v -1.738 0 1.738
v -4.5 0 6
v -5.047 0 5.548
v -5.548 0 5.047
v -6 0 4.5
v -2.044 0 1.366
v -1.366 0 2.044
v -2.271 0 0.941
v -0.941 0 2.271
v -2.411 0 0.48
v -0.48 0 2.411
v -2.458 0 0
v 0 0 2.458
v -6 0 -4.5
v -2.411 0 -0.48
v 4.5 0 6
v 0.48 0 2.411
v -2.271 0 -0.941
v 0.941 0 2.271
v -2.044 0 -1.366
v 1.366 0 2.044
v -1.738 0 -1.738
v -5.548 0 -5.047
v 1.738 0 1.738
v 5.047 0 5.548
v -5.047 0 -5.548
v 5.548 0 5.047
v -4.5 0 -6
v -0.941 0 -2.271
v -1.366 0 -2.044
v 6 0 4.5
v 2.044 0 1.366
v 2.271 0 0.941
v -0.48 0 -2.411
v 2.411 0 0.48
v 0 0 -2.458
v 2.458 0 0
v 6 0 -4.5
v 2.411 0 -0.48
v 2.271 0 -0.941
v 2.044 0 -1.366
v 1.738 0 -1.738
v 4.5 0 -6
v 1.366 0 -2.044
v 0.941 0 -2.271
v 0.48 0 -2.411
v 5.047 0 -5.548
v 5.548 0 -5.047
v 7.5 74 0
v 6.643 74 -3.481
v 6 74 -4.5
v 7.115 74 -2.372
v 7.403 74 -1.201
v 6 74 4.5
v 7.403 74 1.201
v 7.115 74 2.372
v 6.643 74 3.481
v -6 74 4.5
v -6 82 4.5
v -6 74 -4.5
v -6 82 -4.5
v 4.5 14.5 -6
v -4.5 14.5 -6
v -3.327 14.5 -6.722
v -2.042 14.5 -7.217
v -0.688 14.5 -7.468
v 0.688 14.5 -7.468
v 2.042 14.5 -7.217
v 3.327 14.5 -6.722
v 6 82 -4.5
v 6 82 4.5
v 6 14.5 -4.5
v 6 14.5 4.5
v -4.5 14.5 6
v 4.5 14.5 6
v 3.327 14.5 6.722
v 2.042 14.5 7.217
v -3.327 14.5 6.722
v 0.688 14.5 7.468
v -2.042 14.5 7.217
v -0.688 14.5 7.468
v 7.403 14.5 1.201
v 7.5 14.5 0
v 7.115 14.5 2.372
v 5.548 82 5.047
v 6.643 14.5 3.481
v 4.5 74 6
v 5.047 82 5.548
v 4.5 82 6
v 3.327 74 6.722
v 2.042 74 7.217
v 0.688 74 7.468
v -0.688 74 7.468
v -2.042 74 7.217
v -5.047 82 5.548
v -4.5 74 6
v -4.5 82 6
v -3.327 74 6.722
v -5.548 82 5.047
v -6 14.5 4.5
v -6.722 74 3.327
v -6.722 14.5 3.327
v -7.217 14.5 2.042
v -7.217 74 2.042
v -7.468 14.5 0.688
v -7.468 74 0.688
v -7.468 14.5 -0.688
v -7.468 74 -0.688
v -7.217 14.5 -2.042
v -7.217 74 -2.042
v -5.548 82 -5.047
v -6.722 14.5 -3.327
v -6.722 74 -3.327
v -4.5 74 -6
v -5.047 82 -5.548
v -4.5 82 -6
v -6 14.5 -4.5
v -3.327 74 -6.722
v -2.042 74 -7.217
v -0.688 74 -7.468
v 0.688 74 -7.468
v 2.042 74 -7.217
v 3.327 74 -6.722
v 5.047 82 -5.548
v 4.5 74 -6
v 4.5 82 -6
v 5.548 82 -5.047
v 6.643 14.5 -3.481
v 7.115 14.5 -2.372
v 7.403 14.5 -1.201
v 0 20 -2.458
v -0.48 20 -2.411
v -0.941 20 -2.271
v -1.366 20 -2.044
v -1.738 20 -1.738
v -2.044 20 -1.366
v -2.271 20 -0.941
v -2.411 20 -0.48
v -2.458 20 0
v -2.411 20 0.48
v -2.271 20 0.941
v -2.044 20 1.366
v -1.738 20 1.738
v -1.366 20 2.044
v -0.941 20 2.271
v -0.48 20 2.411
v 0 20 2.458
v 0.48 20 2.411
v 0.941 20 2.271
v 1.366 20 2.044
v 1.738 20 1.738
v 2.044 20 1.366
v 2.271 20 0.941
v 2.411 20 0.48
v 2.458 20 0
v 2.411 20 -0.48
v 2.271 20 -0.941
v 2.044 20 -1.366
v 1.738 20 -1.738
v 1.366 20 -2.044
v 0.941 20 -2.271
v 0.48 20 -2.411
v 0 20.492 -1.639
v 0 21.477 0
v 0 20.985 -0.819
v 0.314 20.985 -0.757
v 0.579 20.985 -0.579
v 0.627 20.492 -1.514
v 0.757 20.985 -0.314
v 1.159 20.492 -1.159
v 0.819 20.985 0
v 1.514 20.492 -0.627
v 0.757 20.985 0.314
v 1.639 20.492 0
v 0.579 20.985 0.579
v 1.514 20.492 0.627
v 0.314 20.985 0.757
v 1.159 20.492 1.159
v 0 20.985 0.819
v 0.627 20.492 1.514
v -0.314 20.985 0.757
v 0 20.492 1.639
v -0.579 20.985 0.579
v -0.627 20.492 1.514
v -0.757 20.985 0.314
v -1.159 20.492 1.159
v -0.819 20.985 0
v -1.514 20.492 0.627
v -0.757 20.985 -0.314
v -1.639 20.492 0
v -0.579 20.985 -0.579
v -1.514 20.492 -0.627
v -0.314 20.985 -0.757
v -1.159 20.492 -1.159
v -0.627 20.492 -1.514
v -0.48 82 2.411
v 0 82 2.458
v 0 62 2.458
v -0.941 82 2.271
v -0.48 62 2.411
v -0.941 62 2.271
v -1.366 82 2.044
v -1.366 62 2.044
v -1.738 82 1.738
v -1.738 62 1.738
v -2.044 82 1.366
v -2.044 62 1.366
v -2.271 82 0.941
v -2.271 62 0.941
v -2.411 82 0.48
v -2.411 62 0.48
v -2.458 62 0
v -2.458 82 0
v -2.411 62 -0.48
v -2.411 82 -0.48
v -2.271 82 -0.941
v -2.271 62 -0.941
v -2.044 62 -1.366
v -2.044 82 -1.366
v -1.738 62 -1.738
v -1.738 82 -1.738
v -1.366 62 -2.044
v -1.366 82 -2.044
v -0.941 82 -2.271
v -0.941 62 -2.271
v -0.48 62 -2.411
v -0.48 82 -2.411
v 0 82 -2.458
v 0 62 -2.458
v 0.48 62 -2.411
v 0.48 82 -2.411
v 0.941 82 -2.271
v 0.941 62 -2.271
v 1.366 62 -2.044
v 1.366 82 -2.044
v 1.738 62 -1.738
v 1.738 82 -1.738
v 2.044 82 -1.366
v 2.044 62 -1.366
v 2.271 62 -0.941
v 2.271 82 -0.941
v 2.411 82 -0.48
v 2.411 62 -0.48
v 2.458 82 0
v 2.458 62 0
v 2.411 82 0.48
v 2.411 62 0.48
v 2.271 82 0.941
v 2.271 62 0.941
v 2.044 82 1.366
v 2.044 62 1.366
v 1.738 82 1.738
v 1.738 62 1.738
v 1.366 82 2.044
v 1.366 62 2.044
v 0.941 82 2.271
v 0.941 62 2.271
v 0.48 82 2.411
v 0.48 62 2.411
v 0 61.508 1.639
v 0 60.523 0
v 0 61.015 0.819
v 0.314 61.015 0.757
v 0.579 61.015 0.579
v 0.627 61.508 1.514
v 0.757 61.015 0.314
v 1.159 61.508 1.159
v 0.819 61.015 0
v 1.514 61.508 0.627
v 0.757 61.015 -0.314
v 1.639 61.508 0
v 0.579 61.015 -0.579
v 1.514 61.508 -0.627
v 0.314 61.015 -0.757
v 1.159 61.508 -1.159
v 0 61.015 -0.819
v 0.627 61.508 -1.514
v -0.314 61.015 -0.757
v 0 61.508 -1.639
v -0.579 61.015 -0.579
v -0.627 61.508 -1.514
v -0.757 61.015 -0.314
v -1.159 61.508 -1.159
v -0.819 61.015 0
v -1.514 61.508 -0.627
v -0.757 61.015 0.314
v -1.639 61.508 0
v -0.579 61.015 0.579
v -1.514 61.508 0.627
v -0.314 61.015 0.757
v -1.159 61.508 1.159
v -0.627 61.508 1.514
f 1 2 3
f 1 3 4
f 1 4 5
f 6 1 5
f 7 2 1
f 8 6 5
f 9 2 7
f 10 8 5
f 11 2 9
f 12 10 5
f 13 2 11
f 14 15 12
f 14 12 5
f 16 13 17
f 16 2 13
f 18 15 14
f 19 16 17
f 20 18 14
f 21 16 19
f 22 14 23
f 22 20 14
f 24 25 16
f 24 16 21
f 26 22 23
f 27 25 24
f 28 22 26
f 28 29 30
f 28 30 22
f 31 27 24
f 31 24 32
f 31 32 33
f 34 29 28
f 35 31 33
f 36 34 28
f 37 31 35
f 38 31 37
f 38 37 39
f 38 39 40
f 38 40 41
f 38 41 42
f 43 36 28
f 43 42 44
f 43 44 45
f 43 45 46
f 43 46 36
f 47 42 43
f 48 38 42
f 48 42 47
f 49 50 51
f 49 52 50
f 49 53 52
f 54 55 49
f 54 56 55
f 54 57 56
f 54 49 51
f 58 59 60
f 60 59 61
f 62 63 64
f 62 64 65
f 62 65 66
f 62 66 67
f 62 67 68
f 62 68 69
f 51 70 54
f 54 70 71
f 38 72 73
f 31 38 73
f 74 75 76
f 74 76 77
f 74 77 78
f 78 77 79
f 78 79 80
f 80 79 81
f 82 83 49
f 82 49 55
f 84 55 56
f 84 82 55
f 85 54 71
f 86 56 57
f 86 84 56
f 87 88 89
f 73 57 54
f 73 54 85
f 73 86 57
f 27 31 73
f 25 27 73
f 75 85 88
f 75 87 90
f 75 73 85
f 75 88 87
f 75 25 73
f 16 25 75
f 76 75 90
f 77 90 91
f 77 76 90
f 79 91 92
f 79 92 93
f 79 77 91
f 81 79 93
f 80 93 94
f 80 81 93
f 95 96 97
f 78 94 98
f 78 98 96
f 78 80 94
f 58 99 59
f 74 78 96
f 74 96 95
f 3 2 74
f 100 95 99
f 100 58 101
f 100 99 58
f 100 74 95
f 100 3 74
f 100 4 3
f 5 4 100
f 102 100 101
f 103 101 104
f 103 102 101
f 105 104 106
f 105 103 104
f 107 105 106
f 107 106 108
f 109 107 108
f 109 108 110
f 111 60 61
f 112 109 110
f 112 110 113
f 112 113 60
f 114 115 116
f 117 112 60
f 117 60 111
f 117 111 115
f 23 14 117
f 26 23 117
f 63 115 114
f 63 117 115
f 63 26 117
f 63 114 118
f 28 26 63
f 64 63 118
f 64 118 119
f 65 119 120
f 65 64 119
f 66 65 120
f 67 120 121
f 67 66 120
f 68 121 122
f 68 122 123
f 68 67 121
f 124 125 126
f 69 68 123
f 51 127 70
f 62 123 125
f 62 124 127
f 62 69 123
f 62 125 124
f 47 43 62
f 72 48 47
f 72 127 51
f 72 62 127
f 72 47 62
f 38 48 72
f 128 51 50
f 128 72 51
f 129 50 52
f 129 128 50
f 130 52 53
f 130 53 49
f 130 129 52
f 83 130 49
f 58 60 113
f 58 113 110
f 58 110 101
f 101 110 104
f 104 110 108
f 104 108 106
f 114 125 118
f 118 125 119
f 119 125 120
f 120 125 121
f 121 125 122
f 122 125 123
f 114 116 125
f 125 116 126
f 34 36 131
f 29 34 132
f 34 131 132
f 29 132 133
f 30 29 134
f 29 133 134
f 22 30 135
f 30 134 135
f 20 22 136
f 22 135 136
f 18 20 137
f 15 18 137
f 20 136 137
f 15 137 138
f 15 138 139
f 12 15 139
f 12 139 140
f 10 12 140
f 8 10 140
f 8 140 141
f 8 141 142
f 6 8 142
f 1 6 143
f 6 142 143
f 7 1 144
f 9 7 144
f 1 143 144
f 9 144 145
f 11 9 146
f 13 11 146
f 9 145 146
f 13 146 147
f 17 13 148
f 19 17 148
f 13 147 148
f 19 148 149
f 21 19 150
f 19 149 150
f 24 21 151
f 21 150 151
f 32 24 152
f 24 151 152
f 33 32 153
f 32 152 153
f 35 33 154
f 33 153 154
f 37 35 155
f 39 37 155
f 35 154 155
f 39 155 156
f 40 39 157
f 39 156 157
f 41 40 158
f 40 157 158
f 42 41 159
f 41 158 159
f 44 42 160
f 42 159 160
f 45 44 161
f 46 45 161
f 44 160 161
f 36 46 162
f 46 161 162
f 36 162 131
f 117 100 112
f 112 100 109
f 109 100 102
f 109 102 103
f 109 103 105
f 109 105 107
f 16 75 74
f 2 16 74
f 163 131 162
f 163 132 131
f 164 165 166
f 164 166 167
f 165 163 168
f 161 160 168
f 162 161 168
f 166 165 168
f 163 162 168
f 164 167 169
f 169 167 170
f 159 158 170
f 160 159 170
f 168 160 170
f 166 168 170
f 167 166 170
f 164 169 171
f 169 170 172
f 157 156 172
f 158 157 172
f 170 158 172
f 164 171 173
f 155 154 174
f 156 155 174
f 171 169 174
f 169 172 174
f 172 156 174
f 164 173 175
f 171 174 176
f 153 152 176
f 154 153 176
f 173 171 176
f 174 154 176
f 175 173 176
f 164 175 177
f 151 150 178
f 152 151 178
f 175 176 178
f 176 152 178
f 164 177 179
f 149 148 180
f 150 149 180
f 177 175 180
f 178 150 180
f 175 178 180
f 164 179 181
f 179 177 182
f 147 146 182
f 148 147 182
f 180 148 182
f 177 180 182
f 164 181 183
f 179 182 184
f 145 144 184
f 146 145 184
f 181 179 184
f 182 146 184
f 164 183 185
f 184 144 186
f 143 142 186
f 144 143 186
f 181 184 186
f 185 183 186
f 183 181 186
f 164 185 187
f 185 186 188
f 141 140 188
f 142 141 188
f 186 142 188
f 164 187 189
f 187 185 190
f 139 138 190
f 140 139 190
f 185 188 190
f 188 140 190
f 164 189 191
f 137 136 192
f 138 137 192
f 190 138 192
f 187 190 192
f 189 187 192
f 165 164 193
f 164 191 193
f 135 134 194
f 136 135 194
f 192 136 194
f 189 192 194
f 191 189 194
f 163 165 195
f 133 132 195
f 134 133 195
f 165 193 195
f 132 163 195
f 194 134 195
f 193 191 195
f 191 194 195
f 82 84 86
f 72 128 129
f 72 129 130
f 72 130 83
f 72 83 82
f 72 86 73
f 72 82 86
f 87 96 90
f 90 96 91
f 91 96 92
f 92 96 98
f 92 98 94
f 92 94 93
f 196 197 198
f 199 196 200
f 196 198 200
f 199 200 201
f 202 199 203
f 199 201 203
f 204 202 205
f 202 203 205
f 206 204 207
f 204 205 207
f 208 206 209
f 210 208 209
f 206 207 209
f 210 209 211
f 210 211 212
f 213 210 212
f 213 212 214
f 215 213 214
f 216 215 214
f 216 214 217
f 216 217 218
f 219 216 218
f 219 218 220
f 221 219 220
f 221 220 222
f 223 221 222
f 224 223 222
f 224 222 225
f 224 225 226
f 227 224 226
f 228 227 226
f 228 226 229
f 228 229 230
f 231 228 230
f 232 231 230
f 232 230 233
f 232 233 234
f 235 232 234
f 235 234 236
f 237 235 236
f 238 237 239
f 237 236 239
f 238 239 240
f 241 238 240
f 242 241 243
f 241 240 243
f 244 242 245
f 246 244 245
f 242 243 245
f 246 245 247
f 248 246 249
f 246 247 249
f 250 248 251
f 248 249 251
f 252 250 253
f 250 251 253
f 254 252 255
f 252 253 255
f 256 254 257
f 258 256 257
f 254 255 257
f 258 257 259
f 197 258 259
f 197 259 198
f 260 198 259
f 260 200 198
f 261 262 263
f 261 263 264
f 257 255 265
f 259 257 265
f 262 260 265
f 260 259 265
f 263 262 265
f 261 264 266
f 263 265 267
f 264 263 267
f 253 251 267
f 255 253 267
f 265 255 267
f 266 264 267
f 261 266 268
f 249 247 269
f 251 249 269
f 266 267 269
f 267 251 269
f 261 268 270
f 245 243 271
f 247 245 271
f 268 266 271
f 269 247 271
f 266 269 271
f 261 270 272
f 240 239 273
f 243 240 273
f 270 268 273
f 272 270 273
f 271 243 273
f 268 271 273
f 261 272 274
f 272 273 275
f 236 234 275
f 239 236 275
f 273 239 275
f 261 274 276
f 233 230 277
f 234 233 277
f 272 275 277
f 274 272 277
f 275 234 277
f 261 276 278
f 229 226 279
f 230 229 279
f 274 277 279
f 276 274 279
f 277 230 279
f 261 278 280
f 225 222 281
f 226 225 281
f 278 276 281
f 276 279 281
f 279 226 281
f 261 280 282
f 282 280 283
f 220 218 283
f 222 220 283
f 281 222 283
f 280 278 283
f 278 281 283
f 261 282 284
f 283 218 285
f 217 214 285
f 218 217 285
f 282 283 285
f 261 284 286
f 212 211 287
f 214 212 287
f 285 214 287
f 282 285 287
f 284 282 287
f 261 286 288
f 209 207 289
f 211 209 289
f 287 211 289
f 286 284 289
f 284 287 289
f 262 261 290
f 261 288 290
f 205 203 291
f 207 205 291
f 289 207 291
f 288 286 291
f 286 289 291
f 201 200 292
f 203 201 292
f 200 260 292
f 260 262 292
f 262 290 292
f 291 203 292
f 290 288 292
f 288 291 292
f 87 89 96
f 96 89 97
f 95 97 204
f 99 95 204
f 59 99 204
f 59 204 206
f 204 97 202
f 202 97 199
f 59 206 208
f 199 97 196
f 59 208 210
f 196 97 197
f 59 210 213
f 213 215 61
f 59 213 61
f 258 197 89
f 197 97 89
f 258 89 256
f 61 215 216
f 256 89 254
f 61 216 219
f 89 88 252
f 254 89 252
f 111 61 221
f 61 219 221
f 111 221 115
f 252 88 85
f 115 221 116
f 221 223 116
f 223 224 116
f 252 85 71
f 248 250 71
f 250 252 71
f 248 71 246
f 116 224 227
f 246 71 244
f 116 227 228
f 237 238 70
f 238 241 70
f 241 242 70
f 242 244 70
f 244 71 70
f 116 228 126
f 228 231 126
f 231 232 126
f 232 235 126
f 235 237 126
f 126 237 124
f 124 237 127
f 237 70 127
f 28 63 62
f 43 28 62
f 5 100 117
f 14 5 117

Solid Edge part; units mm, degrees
sketch "Sketch1" plane through (0, 0, 0) normal (0, -1, 0) x (1, 0, 0)
  circle A0 centre (0, 0) radius 7.5
  dimension "D1" = 15
extrude "Protrusion1" add sketch "Sketch1" against normal blind 82
sketch "Sketch2" plane through (0, 0, 0) normal (0, -1, 0) x (1, 0, 0)
  line L0 (-6, -6) -> (6, -6)
  line L1 (6, -6) -> (6, 6)
  line L2 (6, 6) -> (-6, 6)
  line L3 (-6, 6) -> (-6, -6)
  circle A0 centre (0, 0) radius 11.1148
  dimension "D1" = 12
  dimension "D2" = 12
extrude "VaciadoExtruido_1" cut sketch "Sketch2" against normal blind 14.5
sketch "Sketch3" plane through (0, 82, 0) normal (0, 1, 0) x (-1, 0, 0)
  line L0 (-6, 6) -> (6, 6)
  line L1 (6, 6) -> (6, -6)
  line L2 (6, -6) -> (-6, -6)
  line L3 (-6, -6) -> (-6, 6)
  circle A0 centre (0, 0) radius 11.8387
  dimension "D1" = 12
  dimension "D2" = 12
extrude "VaciadoExtruido_2" cut sketch "Sketch3" against normal blind 8
hole "Agujero_1" at (0, 0, 0) direction (0, 1, 0) diameter 4.917 depth 20 tip angle 118 thread major 6 thread length 15
hole "Agujero_2" at (0, 82, 0) direction (0, -1, 0) diameter 4.917 depth 20 tip angle 118 thread major 6 thread length 15
properties part number "1976-1300-007"
